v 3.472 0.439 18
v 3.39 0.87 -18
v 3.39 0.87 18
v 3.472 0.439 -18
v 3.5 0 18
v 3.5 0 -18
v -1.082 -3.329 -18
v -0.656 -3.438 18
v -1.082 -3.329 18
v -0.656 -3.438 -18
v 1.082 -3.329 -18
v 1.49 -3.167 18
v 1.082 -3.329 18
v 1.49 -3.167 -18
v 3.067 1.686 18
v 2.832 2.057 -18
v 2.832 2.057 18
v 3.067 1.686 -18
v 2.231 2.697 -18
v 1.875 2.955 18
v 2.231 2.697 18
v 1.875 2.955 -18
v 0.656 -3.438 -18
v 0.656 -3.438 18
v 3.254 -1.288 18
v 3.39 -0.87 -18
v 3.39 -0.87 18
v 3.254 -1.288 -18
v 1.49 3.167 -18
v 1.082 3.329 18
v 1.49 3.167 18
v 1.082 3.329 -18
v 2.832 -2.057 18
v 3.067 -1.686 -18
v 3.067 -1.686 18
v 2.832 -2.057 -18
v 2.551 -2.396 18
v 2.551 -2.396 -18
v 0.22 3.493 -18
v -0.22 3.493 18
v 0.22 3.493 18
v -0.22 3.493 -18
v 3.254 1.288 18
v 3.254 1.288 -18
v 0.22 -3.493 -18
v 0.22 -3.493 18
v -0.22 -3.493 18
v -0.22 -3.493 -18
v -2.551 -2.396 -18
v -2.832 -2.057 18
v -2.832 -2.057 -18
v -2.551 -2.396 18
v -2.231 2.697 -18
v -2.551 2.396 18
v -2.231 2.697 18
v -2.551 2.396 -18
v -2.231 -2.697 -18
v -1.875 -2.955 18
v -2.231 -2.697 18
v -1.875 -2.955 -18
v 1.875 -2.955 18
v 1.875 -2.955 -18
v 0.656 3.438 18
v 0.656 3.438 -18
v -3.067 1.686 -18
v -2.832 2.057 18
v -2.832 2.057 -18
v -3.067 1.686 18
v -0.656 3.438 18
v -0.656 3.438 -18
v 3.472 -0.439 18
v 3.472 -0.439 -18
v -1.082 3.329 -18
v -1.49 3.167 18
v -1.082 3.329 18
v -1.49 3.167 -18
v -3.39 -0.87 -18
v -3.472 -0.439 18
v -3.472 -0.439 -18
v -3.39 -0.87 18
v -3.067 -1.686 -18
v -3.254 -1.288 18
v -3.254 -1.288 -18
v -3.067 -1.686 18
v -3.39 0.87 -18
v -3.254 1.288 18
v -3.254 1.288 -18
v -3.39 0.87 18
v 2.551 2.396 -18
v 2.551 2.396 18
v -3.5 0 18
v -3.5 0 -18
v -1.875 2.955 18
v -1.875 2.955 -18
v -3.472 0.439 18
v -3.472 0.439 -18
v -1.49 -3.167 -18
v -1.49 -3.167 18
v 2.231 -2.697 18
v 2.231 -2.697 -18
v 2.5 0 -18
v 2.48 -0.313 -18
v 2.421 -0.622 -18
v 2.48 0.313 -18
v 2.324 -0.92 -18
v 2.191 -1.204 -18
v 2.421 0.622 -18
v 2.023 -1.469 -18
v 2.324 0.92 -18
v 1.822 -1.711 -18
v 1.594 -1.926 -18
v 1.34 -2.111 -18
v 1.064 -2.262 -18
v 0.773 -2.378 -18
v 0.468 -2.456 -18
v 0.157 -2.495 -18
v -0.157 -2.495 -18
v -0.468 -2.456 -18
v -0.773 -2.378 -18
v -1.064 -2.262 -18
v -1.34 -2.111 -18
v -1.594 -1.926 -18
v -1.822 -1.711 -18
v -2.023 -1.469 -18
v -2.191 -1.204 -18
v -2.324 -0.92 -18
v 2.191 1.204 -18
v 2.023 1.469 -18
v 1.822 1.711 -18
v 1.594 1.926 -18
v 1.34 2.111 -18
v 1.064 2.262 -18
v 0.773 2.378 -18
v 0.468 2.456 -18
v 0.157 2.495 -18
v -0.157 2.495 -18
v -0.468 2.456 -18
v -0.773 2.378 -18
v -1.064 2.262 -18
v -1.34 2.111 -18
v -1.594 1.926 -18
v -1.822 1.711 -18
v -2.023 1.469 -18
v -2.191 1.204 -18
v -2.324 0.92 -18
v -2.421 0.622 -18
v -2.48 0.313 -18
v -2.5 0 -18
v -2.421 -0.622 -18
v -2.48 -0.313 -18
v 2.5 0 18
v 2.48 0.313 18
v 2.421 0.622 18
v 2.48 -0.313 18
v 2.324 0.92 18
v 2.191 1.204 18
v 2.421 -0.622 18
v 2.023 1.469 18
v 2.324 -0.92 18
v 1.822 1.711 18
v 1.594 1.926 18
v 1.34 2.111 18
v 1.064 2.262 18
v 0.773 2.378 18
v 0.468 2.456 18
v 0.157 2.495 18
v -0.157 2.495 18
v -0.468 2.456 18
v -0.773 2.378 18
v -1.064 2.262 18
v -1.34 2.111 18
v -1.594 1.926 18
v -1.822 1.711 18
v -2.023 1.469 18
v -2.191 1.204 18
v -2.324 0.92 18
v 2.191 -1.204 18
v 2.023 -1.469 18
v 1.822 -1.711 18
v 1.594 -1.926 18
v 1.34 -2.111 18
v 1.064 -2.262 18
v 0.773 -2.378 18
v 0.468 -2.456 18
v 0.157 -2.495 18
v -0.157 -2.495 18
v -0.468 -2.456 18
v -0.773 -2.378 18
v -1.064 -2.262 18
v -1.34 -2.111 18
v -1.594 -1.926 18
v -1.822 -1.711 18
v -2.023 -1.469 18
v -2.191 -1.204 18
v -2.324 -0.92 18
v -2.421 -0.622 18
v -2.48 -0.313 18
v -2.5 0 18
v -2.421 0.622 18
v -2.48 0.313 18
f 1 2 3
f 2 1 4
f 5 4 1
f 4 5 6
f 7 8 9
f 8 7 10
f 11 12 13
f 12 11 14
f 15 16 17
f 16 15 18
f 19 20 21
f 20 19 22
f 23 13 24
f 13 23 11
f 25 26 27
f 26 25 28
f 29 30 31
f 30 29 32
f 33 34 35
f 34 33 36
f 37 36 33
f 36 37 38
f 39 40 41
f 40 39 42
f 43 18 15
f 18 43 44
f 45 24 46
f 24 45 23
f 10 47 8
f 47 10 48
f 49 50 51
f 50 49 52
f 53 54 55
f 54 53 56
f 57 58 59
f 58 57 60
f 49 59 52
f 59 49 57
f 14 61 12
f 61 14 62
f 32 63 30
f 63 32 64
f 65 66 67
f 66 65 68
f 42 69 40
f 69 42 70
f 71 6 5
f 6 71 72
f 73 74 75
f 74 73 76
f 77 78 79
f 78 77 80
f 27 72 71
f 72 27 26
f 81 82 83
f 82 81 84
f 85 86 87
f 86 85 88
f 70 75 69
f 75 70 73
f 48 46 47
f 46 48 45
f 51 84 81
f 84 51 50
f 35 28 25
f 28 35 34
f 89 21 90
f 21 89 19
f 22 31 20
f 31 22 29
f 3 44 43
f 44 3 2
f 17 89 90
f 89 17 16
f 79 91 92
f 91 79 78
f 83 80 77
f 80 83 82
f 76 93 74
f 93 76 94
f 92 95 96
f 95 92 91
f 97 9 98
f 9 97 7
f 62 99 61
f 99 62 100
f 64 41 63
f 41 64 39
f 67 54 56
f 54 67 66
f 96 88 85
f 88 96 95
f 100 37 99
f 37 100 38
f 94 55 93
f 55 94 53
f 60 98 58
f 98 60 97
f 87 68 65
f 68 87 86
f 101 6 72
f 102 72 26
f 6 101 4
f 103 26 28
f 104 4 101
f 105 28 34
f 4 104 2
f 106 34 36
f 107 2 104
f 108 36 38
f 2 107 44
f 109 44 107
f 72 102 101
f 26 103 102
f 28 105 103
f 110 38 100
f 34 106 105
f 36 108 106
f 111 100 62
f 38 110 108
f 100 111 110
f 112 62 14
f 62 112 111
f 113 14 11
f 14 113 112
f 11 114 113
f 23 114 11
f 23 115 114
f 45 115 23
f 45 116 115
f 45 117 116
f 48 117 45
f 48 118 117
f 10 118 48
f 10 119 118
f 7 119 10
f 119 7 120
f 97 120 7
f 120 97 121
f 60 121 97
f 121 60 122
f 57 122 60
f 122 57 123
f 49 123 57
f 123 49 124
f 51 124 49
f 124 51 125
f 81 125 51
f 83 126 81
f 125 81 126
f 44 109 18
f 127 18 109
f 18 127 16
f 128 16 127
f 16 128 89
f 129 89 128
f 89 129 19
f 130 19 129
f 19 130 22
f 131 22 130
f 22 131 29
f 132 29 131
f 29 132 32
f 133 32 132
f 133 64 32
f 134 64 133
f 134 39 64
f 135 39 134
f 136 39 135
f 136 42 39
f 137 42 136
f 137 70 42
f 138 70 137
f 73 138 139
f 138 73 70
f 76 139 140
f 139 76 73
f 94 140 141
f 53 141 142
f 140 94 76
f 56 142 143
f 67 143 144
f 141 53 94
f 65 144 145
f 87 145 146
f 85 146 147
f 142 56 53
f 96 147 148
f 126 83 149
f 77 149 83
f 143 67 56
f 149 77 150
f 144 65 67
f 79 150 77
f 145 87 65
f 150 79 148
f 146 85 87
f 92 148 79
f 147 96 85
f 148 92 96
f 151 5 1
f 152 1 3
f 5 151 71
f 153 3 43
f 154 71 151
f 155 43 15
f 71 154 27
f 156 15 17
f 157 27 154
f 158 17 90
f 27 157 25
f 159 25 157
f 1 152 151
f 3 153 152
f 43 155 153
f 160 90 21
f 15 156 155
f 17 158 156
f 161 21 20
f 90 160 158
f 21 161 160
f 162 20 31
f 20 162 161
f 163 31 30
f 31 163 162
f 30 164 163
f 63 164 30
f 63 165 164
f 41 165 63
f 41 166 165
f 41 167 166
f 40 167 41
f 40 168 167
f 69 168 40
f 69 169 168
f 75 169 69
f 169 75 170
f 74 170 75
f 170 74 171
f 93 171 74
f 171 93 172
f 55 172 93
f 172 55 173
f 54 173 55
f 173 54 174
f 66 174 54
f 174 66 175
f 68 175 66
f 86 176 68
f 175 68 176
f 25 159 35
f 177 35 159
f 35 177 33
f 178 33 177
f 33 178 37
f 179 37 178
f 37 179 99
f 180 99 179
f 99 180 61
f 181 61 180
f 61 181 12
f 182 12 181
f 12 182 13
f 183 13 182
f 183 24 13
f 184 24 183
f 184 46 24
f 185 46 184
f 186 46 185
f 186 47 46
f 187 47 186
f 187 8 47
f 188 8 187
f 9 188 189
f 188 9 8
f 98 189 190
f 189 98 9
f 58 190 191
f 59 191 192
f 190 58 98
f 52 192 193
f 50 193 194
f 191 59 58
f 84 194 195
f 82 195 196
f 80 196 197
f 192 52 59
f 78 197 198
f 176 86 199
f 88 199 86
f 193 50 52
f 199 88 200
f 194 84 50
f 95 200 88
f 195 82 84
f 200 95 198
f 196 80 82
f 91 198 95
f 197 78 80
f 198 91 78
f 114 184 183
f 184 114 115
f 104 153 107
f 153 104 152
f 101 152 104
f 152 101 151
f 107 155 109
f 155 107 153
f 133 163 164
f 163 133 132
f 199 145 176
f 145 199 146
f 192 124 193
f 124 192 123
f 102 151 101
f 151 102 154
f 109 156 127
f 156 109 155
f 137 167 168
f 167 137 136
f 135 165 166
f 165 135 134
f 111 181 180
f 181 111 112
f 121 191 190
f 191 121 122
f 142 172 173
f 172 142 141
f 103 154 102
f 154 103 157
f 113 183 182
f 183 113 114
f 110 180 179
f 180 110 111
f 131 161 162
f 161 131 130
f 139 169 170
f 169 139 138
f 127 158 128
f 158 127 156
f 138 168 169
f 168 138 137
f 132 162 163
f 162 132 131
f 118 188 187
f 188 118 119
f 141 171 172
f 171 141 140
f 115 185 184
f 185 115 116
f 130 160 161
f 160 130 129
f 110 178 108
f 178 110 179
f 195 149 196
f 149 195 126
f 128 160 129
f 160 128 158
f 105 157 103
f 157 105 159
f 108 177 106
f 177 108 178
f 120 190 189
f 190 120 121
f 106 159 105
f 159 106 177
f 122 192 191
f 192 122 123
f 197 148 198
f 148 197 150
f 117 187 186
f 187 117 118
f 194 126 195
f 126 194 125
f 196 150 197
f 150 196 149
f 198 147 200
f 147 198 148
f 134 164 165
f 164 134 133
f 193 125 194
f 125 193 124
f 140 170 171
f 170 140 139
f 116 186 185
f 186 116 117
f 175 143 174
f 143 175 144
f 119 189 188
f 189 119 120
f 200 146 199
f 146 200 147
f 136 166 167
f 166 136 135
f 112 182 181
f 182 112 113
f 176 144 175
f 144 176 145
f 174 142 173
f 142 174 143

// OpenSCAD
$fn = 50;


difference() {
	union() {
		translate(v = [0, 0, -18.0000000000]) {
			cylinder(h = 36, r = 3.5000000000);
		}
	}
	union() {
		translate(v = [0, 0, -100.0000000000]) {
			cylinder(h = 200, r = 2.5000000000);
		}
	}
}
